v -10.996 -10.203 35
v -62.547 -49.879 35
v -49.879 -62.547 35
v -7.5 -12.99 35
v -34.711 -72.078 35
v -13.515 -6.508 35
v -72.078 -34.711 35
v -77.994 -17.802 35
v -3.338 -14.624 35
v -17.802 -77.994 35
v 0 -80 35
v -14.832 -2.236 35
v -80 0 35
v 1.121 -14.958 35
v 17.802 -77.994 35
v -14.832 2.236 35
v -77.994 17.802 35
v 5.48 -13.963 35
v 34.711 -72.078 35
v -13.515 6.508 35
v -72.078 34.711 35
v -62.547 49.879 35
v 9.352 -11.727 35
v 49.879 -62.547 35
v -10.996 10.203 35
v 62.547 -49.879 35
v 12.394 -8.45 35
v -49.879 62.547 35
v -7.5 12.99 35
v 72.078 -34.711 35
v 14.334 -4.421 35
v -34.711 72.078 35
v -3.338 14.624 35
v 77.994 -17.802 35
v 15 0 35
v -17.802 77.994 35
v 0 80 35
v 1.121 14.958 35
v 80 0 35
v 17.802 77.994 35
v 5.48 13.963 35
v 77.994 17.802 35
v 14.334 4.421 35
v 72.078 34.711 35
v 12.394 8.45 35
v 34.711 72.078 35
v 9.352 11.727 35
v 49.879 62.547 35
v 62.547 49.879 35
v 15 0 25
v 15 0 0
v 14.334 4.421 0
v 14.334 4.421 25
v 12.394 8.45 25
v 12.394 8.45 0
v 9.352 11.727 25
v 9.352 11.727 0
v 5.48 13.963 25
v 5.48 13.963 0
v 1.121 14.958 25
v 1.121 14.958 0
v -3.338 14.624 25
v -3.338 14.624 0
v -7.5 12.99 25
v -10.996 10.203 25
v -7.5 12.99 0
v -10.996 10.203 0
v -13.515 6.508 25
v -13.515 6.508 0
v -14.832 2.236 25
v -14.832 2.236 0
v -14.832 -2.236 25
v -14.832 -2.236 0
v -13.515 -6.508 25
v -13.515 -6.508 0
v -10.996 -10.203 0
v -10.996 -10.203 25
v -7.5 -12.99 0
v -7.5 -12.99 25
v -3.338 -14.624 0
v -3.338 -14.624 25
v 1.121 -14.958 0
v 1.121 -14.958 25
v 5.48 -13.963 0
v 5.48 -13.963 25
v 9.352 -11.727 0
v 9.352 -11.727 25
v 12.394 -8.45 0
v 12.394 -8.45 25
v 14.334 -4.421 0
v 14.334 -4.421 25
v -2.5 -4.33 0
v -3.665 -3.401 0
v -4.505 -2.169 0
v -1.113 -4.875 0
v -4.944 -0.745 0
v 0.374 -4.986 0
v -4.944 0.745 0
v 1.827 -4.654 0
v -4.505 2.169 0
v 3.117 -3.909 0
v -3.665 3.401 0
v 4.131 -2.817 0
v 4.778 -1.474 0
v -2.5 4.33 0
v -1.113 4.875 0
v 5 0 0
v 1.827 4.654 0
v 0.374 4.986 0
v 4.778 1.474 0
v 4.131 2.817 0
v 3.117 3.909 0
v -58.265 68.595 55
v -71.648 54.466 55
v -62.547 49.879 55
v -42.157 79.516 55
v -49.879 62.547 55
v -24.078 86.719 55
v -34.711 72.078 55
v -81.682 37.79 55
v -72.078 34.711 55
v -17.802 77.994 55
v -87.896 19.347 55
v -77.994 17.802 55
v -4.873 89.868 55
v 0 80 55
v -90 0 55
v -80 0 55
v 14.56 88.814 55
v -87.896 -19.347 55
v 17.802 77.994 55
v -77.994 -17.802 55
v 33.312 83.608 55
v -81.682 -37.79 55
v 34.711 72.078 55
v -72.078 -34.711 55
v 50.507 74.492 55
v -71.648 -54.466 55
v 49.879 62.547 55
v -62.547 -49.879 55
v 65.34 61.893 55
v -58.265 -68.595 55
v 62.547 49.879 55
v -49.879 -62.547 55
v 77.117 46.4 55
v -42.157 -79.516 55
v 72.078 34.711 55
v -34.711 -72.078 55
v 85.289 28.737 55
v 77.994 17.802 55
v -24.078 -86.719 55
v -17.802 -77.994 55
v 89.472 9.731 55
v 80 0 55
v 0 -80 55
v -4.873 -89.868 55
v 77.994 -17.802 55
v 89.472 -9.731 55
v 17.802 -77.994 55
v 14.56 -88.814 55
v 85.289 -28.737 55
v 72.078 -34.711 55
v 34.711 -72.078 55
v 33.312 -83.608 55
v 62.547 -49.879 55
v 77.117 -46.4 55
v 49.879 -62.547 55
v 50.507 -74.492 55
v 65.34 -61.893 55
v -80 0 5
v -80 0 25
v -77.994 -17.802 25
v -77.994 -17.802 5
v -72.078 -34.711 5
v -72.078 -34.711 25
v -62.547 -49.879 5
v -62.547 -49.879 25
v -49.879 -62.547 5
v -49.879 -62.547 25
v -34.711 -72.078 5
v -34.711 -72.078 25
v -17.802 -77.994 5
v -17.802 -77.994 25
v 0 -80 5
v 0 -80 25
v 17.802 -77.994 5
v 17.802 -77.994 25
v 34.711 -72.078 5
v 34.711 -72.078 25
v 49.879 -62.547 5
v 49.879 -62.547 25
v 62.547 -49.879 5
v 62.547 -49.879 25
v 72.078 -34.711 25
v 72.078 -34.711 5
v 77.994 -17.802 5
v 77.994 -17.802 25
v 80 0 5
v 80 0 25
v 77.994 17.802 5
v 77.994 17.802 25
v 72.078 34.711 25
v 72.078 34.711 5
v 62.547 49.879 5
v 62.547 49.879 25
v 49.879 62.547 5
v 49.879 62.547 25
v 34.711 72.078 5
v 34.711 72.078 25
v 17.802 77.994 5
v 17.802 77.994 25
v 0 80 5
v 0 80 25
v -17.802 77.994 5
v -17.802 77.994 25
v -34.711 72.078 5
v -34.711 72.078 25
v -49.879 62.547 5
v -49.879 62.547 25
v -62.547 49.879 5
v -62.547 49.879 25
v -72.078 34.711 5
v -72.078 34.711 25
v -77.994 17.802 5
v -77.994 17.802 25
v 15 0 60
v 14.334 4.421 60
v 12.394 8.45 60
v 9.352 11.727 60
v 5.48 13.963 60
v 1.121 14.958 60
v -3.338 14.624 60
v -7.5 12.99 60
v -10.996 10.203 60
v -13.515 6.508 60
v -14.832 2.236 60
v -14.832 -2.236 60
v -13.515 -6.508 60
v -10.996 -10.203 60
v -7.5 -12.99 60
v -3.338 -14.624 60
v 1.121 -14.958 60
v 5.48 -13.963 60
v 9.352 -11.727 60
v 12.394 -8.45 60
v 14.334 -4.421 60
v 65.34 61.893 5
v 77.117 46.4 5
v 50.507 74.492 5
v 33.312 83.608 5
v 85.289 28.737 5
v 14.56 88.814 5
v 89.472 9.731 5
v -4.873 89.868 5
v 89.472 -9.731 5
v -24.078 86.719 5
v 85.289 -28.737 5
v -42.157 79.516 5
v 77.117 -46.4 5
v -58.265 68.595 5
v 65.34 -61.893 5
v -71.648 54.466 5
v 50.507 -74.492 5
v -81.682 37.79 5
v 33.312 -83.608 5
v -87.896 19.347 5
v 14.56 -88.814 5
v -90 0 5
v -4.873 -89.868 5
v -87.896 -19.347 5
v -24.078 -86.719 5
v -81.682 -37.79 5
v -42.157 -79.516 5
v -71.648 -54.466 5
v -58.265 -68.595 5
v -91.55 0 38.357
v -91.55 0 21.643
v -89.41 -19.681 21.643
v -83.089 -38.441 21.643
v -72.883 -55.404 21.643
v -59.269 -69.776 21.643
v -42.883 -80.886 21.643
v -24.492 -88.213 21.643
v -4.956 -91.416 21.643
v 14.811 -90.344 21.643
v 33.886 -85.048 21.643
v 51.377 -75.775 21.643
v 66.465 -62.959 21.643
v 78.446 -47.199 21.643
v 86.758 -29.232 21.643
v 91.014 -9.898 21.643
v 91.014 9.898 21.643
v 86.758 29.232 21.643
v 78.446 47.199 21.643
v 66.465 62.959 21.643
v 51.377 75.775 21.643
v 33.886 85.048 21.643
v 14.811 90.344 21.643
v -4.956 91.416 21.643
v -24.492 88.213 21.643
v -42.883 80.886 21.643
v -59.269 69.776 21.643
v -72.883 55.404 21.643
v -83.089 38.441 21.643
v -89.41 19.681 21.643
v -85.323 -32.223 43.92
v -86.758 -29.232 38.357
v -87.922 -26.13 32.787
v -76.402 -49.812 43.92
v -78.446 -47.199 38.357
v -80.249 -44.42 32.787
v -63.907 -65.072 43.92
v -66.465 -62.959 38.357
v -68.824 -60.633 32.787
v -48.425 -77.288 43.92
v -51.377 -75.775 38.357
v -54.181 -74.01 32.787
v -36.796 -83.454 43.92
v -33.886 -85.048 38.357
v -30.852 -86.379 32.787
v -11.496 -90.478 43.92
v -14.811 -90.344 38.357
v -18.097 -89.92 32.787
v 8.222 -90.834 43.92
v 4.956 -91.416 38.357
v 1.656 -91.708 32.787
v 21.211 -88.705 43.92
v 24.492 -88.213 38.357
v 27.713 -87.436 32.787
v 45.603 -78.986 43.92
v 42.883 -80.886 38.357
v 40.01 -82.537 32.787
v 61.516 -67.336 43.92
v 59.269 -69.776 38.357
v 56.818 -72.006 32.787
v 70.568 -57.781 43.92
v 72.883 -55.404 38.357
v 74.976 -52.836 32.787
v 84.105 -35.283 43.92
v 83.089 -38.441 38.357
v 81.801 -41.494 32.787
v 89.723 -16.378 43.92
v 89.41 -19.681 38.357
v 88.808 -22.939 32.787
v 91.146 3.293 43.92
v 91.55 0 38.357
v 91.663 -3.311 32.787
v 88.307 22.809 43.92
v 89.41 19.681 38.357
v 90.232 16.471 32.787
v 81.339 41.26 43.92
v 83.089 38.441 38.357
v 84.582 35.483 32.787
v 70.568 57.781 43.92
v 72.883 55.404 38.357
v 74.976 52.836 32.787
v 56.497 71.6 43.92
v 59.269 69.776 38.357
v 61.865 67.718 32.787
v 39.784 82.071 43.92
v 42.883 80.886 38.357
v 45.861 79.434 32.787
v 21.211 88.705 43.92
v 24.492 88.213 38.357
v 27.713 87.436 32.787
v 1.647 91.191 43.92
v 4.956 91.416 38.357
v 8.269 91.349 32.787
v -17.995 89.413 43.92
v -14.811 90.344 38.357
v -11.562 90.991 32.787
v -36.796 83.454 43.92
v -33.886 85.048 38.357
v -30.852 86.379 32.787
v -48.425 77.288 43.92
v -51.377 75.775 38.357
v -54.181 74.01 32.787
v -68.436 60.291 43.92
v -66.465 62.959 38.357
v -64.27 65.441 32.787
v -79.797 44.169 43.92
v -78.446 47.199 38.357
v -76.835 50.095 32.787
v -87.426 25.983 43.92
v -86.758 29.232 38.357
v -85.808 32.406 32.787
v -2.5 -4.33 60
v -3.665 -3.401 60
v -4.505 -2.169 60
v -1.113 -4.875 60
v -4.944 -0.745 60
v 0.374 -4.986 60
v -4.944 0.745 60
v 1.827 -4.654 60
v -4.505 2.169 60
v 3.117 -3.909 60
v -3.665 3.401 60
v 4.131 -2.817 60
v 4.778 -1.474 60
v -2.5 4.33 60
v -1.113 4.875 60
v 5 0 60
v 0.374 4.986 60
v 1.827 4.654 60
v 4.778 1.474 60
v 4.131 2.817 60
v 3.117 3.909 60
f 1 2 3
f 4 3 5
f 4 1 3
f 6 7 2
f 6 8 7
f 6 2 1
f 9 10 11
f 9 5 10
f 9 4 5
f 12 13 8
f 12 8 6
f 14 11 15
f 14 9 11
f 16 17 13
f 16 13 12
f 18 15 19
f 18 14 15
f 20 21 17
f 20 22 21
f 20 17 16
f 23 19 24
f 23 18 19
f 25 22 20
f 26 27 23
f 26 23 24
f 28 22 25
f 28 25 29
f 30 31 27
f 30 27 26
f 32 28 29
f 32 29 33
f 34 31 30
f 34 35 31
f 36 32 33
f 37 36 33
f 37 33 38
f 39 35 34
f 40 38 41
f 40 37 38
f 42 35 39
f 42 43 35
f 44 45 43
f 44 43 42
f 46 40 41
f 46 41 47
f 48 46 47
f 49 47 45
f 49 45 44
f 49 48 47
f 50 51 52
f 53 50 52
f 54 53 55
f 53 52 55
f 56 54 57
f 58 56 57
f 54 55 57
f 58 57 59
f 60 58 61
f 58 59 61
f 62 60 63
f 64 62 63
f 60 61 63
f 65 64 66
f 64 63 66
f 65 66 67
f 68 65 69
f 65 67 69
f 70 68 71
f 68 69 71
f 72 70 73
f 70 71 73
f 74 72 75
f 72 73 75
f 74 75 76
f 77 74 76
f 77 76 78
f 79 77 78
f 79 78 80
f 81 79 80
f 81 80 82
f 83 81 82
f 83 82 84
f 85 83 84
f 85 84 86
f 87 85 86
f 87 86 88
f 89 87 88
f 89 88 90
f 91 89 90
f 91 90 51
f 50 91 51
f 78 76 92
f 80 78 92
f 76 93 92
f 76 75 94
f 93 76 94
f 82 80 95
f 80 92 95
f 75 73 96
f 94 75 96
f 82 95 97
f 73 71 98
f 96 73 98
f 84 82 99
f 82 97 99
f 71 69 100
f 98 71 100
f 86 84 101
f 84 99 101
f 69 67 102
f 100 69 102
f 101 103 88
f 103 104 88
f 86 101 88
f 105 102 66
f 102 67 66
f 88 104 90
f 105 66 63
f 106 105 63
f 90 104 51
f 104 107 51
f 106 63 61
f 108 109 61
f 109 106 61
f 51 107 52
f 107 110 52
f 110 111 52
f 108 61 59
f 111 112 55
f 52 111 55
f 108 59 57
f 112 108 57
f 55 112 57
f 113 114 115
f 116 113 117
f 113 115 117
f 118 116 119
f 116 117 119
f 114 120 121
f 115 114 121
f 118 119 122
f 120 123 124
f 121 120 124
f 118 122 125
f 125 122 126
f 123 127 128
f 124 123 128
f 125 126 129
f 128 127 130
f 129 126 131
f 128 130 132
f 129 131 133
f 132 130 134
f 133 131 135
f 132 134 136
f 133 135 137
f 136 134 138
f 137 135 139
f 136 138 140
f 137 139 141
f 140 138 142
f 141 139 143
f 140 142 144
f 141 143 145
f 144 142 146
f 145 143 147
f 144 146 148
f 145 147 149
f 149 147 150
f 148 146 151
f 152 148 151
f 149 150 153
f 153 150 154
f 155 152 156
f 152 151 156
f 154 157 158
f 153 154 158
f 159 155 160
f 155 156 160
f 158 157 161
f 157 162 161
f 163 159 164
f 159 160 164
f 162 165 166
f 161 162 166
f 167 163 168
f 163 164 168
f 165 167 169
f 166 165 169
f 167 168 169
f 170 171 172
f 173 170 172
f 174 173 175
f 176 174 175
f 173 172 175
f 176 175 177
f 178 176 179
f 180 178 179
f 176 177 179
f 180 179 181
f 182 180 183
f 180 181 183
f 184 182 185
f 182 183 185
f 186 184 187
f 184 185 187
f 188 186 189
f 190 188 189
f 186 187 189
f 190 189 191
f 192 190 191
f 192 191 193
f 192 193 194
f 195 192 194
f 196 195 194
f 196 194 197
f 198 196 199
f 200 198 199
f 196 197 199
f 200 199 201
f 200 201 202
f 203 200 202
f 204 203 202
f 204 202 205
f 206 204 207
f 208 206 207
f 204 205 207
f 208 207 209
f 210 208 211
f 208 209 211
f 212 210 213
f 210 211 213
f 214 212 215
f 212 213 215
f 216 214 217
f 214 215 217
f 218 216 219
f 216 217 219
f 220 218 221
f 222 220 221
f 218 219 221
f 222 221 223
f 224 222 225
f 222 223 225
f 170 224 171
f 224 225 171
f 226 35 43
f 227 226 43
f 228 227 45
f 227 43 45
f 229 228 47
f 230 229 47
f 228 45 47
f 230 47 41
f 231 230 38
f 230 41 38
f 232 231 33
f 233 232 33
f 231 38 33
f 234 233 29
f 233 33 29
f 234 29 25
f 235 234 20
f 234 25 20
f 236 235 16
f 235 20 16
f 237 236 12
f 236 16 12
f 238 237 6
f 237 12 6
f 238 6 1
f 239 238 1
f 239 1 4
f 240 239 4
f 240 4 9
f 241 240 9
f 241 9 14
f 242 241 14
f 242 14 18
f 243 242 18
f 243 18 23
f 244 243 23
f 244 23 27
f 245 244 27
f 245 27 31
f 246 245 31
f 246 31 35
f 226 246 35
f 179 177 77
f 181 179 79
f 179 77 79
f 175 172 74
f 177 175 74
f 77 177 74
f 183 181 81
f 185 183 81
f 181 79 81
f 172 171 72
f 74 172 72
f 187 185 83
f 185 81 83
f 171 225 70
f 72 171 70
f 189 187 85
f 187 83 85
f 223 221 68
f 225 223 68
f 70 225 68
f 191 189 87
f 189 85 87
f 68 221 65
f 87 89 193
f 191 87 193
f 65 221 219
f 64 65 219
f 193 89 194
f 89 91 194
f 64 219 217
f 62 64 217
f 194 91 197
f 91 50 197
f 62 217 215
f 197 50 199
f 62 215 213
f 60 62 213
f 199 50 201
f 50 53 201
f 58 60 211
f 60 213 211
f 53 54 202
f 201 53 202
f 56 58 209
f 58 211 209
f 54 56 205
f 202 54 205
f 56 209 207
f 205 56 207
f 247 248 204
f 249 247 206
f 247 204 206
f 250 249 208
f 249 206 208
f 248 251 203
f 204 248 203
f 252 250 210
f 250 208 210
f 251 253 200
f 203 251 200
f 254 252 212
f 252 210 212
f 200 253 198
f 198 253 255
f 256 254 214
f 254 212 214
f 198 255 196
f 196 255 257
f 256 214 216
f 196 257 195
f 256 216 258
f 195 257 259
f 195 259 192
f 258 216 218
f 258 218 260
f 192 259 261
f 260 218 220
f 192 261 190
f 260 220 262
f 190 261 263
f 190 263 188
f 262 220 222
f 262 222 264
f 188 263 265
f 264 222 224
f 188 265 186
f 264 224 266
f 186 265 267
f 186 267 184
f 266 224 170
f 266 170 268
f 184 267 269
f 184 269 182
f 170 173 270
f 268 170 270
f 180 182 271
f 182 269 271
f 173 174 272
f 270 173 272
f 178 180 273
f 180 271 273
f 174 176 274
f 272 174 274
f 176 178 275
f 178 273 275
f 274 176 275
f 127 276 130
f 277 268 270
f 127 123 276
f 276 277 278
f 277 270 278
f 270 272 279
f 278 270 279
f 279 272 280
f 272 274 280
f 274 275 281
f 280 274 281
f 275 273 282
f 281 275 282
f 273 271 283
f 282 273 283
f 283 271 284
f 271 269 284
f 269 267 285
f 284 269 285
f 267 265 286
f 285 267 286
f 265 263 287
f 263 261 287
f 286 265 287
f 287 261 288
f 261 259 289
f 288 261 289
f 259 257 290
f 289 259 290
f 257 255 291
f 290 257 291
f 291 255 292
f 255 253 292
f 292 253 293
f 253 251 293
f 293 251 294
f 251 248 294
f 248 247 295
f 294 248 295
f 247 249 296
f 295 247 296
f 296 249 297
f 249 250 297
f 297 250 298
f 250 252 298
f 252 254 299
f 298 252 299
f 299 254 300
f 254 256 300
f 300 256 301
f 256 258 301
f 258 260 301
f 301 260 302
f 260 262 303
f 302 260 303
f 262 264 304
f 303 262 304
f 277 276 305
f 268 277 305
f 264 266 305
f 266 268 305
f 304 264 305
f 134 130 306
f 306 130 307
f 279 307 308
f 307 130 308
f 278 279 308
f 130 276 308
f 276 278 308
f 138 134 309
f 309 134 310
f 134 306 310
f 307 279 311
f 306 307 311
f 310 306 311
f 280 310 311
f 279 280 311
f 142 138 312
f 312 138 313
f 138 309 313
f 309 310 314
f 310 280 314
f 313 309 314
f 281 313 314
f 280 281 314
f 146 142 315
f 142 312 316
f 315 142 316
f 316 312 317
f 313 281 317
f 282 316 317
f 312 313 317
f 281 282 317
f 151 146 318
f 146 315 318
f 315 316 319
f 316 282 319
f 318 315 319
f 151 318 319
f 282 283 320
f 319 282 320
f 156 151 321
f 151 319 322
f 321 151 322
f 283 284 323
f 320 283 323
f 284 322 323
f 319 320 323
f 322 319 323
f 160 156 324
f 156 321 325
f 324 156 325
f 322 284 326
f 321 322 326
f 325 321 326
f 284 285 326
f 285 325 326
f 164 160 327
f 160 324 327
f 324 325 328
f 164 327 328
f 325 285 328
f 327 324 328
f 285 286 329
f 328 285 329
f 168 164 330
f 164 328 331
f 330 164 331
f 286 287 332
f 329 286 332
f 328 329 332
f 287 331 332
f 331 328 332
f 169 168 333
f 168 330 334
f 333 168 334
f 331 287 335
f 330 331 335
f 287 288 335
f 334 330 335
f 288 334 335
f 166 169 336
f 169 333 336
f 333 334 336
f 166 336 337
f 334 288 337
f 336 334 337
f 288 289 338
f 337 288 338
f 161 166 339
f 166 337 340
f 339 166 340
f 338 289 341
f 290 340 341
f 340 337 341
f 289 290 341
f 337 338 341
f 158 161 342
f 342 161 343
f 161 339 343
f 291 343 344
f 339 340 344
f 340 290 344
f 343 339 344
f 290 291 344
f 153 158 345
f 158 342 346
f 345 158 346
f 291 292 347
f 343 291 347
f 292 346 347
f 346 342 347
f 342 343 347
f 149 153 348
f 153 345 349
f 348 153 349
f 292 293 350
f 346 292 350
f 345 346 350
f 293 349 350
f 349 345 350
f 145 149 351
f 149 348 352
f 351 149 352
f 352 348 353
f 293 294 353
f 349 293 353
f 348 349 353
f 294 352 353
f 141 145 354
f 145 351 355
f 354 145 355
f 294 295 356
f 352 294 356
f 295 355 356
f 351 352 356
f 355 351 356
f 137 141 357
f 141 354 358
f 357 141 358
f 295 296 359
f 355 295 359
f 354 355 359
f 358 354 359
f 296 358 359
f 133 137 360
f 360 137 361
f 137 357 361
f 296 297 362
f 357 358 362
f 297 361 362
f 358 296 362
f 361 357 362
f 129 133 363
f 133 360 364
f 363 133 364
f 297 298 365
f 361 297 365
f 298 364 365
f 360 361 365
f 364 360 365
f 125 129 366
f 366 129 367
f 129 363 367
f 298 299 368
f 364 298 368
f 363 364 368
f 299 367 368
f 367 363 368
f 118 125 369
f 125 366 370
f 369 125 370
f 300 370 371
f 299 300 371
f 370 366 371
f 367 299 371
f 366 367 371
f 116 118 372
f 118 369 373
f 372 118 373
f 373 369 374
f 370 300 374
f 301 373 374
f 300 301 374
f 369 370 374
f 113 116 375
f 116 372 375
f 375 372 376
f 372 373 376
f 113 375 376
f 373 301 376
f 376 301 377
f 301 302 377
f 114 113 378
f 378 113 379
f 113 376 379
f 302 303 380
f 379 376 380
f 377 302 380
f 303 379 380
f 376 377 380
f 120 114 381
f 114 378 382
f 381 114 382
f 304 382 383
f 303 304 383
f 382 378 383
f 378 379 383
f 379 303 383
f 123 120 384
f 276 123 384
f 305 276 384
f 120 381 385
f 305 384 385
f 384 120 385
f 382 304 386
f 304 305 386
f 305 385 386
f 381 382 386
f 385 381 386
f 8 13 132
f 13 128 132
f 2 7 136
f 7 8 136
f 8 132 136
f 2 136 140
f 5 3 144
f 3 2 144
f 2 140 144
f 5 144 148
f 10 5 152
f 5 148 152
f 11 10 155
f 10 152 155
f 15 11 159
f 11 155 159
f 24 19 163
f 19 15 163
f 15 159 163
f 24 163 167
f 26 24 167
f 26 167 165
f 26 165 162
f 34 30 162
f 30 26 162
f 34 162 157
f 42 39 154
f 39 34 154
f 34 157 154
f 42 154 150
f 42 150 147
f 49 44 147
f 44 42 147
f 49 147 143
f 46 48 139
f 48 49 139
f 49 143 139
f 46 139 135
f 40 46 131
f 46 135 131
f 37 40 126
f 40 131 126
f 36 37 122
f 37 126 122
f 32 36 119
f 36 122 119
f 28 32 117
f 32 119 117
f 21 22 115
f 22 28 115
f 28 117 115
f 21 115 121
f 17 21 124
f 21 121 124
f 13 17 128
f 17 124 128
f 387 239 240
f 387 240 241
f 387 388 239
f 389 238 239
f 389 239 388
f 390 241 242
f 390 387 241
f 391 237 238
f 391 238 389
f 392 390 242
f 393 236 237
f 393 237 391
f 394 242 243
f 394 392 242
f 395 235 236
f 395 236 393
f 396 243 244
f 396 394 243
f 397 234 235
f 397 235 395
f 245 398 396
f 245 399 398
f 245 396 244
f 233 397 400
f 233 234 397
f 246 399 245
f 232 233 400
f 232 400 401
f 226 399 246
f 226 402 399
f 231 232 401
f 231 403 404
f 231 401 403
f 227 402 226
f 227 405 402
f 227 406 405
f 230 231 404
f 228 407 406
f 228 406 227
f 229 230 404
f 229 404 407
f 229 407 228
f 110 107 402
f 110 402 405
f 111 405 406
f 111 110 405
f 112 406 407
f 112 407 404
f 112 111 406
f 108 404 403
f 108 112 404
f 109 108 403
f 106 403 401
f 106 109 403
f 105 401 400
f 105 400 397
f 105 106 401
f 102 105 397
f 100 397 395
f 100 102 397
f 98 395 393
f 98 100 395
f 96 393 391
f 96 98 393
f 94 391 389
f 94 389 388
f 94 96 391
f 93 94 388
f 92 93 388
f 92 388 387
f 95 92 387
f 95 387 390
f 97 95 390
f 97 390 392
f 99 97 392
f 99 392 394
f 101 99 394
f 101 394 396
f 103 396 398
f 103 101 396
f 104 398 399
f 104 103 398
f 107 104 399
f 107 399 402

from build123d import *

# Parameters (mm, degrees)
SCHIZZO1_R                   = 15
SCHIZZO1_R_2                 = 5
ESTRUSIONE_ESTRUSIONE1_DEPTH = 60
SCHIZZO2_R                   = 80
SCHIZZO2_R_2                 = 15
ESTRUSIONE_ESTRUSIONE2_DEPTH = 5


with BuildPart() as part:
    # Schizzo1 → Estrusione-Estrusione1 (new body)
    with BuildSketch(Plane.XY):
        Circle(SCHIZZO1_R)
        Circle(SCHIZZO1_R_2, mode=Mode.SUBTRACT)
    extrude(amount=ESTRUSIONE_ESTRUSIONE1_DEPTH)

    # Schizzo2 → Estrusione-Estrusione2 (add, symmetric)
    with BuildSketch(Plane.XY.offset(30)):
        Circle(SCHIZZO2_R)
        Circle(SCHIZZO2_R_2, mode=Mode.SUBTRACT)
    extrude(amount=ESTRUSIONE_ESTRUSIONE2_DEPTH, both=True)

    # Schizzo3 → Rivoluzione1 (revolve)
    with BuildSketch(Plane(origin=(0, 0, 0), x_dir=(0, 0, -1), z_dir=(1, 0, 0)), mode=Mode.PRIVATE) as rivoluzione1_sk:
        with BuildLine():
            Line((-5, 80), (-55, 80))
            Line((-55, 80), (-55, 90))
            ThreePointArc((-55, 90), (-30, 91.7445653), (-5, 90))
            Line((-5, 90), (-5, 80))
        make_face()
    revolve(rivoluzione1_sk.sketch.rotate(Axis((0, 0, 0), (0, 0, 1)), 90), axis=Axis((0, 0, 0), (0, 0, 1)))


solid = part.part
